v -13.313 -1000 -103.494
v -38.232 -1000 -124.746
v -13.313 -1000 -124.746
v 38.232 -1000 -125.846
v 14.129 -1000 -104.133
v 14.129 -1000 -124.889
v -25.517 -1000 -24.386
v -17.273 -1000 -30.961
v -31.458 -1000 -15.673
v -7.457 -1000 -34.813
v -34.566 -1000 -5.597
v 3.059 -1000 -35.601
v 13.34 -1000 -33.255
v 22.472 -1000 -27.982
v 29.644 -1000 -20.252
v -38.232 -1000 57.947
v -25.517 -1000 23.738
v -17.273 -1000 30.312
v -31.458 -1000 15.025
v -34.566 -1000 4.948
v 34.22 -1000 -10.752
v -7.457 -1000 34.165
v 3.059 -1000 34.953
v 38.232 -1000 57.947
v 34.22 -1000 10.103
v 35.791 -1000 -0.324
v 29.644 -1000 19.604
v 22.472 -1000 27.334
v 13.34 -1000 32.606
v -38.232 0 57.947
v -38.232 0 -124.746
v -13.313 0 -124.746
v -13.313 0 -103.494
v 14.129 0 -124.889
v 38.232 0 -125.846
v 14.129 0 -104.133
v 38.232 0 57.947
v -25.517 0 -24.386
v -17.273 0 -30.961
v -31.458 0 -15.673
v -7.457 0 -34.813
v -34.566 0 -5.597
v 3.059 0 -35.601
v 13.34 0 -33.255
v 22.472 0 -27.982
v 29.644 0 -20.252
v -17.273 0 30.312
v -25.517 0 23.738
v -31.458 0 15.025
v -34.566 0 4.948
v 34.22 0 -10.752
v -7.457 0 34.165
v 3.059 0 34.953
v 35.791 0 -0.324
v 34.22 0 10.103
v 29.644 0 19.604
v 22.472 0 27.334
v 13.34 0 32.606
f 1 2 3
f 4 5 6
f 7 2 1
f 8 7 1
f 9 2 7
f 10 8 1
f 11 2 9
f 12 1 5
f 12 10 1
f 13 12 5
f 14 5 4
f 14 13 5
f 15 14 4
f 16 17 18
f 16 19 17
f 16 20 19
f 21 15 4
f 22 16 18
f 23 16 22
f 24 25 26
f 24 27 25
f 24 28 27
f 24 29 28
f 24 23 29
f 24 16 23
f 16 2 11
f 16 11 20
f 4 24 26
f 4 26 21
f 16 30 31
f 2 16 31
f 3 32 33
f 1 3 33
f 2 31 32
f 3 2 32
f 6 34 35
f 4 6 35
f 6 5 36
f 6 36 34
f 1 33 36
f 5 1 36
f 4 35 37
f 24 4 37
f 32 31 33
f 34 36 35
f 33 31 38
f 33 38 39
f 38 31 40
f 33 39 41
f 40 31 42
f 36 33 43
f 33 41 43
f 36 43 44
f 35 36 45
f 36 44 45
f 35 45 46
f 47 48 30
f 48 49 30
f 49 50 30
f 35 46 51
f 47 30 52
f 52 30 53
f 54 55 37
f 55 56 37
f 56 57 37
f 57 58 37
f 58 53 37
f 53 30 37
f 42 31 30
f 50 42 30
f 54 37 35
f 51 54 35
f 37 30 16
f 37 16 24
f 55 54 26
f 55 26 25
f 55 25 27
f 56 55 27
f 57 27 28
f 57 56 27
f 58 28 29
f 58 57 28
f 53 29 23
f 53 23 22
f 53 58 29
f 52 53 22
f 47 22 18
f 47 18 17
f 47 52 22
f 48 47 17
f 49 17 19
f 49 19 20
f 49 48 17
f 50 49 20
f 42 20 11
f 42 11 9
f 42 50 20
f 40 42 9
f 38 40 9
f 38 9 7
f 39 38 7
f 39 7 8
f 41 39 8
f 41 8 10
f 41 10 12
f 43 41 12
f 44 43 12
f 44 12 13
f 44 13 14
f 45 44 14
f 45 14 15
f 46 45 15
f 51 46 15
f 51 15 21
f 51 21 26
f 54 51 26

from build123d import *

# Parameters (mm, degrees)
F0_W     = 76.464056
F0_H     = 115.89399
F0_R     = 35.376102
F1_DEPTH = 1000
F2_DEPTH = 600


with BuildPart() as f1:
    # F0 (on Front) → F1 (new body)
    with BuildSketch(Plane.XZ):
        Rectangle(F0_W, F0_H)
        with Locations((0.415236, -0.324309)):
            Circle(F0_R, mode=Mode.SUBTRACT)
        Polygon((38.232028, -125.84649), (38.232028, -57.946995), (-38.232028, -57.946995), (-38.232028, -124.745652), (-13.313413, -124.745652), (-13.313413, -103.494123), (14.12918, -104.132757), (14.12918, -124.888524), align=None)
    extrude(amount=F1_DEPTH)

    # F0 (on Front) → F2 (join)
    with BuildSketch(Plane.XZ):
        Rectangle(F0_W, F0_H)
        with Locations((0.415236, -0.324309)):
            Circle(F0_R, mode=Mode.SUBTRACT)
        Polygon((38.232028, -125.84649), (38.232028, -57.946995), (-38.232028, -57.946995), (-38.232028, -124.745652), (-13.313413, -124.745652), (-13.313413, -103.494123), (14.12918, -104.132757), (14.12918, -124.888524), align=None)
    extrude(amount=F2_DEPTH)


solid = f1.part
